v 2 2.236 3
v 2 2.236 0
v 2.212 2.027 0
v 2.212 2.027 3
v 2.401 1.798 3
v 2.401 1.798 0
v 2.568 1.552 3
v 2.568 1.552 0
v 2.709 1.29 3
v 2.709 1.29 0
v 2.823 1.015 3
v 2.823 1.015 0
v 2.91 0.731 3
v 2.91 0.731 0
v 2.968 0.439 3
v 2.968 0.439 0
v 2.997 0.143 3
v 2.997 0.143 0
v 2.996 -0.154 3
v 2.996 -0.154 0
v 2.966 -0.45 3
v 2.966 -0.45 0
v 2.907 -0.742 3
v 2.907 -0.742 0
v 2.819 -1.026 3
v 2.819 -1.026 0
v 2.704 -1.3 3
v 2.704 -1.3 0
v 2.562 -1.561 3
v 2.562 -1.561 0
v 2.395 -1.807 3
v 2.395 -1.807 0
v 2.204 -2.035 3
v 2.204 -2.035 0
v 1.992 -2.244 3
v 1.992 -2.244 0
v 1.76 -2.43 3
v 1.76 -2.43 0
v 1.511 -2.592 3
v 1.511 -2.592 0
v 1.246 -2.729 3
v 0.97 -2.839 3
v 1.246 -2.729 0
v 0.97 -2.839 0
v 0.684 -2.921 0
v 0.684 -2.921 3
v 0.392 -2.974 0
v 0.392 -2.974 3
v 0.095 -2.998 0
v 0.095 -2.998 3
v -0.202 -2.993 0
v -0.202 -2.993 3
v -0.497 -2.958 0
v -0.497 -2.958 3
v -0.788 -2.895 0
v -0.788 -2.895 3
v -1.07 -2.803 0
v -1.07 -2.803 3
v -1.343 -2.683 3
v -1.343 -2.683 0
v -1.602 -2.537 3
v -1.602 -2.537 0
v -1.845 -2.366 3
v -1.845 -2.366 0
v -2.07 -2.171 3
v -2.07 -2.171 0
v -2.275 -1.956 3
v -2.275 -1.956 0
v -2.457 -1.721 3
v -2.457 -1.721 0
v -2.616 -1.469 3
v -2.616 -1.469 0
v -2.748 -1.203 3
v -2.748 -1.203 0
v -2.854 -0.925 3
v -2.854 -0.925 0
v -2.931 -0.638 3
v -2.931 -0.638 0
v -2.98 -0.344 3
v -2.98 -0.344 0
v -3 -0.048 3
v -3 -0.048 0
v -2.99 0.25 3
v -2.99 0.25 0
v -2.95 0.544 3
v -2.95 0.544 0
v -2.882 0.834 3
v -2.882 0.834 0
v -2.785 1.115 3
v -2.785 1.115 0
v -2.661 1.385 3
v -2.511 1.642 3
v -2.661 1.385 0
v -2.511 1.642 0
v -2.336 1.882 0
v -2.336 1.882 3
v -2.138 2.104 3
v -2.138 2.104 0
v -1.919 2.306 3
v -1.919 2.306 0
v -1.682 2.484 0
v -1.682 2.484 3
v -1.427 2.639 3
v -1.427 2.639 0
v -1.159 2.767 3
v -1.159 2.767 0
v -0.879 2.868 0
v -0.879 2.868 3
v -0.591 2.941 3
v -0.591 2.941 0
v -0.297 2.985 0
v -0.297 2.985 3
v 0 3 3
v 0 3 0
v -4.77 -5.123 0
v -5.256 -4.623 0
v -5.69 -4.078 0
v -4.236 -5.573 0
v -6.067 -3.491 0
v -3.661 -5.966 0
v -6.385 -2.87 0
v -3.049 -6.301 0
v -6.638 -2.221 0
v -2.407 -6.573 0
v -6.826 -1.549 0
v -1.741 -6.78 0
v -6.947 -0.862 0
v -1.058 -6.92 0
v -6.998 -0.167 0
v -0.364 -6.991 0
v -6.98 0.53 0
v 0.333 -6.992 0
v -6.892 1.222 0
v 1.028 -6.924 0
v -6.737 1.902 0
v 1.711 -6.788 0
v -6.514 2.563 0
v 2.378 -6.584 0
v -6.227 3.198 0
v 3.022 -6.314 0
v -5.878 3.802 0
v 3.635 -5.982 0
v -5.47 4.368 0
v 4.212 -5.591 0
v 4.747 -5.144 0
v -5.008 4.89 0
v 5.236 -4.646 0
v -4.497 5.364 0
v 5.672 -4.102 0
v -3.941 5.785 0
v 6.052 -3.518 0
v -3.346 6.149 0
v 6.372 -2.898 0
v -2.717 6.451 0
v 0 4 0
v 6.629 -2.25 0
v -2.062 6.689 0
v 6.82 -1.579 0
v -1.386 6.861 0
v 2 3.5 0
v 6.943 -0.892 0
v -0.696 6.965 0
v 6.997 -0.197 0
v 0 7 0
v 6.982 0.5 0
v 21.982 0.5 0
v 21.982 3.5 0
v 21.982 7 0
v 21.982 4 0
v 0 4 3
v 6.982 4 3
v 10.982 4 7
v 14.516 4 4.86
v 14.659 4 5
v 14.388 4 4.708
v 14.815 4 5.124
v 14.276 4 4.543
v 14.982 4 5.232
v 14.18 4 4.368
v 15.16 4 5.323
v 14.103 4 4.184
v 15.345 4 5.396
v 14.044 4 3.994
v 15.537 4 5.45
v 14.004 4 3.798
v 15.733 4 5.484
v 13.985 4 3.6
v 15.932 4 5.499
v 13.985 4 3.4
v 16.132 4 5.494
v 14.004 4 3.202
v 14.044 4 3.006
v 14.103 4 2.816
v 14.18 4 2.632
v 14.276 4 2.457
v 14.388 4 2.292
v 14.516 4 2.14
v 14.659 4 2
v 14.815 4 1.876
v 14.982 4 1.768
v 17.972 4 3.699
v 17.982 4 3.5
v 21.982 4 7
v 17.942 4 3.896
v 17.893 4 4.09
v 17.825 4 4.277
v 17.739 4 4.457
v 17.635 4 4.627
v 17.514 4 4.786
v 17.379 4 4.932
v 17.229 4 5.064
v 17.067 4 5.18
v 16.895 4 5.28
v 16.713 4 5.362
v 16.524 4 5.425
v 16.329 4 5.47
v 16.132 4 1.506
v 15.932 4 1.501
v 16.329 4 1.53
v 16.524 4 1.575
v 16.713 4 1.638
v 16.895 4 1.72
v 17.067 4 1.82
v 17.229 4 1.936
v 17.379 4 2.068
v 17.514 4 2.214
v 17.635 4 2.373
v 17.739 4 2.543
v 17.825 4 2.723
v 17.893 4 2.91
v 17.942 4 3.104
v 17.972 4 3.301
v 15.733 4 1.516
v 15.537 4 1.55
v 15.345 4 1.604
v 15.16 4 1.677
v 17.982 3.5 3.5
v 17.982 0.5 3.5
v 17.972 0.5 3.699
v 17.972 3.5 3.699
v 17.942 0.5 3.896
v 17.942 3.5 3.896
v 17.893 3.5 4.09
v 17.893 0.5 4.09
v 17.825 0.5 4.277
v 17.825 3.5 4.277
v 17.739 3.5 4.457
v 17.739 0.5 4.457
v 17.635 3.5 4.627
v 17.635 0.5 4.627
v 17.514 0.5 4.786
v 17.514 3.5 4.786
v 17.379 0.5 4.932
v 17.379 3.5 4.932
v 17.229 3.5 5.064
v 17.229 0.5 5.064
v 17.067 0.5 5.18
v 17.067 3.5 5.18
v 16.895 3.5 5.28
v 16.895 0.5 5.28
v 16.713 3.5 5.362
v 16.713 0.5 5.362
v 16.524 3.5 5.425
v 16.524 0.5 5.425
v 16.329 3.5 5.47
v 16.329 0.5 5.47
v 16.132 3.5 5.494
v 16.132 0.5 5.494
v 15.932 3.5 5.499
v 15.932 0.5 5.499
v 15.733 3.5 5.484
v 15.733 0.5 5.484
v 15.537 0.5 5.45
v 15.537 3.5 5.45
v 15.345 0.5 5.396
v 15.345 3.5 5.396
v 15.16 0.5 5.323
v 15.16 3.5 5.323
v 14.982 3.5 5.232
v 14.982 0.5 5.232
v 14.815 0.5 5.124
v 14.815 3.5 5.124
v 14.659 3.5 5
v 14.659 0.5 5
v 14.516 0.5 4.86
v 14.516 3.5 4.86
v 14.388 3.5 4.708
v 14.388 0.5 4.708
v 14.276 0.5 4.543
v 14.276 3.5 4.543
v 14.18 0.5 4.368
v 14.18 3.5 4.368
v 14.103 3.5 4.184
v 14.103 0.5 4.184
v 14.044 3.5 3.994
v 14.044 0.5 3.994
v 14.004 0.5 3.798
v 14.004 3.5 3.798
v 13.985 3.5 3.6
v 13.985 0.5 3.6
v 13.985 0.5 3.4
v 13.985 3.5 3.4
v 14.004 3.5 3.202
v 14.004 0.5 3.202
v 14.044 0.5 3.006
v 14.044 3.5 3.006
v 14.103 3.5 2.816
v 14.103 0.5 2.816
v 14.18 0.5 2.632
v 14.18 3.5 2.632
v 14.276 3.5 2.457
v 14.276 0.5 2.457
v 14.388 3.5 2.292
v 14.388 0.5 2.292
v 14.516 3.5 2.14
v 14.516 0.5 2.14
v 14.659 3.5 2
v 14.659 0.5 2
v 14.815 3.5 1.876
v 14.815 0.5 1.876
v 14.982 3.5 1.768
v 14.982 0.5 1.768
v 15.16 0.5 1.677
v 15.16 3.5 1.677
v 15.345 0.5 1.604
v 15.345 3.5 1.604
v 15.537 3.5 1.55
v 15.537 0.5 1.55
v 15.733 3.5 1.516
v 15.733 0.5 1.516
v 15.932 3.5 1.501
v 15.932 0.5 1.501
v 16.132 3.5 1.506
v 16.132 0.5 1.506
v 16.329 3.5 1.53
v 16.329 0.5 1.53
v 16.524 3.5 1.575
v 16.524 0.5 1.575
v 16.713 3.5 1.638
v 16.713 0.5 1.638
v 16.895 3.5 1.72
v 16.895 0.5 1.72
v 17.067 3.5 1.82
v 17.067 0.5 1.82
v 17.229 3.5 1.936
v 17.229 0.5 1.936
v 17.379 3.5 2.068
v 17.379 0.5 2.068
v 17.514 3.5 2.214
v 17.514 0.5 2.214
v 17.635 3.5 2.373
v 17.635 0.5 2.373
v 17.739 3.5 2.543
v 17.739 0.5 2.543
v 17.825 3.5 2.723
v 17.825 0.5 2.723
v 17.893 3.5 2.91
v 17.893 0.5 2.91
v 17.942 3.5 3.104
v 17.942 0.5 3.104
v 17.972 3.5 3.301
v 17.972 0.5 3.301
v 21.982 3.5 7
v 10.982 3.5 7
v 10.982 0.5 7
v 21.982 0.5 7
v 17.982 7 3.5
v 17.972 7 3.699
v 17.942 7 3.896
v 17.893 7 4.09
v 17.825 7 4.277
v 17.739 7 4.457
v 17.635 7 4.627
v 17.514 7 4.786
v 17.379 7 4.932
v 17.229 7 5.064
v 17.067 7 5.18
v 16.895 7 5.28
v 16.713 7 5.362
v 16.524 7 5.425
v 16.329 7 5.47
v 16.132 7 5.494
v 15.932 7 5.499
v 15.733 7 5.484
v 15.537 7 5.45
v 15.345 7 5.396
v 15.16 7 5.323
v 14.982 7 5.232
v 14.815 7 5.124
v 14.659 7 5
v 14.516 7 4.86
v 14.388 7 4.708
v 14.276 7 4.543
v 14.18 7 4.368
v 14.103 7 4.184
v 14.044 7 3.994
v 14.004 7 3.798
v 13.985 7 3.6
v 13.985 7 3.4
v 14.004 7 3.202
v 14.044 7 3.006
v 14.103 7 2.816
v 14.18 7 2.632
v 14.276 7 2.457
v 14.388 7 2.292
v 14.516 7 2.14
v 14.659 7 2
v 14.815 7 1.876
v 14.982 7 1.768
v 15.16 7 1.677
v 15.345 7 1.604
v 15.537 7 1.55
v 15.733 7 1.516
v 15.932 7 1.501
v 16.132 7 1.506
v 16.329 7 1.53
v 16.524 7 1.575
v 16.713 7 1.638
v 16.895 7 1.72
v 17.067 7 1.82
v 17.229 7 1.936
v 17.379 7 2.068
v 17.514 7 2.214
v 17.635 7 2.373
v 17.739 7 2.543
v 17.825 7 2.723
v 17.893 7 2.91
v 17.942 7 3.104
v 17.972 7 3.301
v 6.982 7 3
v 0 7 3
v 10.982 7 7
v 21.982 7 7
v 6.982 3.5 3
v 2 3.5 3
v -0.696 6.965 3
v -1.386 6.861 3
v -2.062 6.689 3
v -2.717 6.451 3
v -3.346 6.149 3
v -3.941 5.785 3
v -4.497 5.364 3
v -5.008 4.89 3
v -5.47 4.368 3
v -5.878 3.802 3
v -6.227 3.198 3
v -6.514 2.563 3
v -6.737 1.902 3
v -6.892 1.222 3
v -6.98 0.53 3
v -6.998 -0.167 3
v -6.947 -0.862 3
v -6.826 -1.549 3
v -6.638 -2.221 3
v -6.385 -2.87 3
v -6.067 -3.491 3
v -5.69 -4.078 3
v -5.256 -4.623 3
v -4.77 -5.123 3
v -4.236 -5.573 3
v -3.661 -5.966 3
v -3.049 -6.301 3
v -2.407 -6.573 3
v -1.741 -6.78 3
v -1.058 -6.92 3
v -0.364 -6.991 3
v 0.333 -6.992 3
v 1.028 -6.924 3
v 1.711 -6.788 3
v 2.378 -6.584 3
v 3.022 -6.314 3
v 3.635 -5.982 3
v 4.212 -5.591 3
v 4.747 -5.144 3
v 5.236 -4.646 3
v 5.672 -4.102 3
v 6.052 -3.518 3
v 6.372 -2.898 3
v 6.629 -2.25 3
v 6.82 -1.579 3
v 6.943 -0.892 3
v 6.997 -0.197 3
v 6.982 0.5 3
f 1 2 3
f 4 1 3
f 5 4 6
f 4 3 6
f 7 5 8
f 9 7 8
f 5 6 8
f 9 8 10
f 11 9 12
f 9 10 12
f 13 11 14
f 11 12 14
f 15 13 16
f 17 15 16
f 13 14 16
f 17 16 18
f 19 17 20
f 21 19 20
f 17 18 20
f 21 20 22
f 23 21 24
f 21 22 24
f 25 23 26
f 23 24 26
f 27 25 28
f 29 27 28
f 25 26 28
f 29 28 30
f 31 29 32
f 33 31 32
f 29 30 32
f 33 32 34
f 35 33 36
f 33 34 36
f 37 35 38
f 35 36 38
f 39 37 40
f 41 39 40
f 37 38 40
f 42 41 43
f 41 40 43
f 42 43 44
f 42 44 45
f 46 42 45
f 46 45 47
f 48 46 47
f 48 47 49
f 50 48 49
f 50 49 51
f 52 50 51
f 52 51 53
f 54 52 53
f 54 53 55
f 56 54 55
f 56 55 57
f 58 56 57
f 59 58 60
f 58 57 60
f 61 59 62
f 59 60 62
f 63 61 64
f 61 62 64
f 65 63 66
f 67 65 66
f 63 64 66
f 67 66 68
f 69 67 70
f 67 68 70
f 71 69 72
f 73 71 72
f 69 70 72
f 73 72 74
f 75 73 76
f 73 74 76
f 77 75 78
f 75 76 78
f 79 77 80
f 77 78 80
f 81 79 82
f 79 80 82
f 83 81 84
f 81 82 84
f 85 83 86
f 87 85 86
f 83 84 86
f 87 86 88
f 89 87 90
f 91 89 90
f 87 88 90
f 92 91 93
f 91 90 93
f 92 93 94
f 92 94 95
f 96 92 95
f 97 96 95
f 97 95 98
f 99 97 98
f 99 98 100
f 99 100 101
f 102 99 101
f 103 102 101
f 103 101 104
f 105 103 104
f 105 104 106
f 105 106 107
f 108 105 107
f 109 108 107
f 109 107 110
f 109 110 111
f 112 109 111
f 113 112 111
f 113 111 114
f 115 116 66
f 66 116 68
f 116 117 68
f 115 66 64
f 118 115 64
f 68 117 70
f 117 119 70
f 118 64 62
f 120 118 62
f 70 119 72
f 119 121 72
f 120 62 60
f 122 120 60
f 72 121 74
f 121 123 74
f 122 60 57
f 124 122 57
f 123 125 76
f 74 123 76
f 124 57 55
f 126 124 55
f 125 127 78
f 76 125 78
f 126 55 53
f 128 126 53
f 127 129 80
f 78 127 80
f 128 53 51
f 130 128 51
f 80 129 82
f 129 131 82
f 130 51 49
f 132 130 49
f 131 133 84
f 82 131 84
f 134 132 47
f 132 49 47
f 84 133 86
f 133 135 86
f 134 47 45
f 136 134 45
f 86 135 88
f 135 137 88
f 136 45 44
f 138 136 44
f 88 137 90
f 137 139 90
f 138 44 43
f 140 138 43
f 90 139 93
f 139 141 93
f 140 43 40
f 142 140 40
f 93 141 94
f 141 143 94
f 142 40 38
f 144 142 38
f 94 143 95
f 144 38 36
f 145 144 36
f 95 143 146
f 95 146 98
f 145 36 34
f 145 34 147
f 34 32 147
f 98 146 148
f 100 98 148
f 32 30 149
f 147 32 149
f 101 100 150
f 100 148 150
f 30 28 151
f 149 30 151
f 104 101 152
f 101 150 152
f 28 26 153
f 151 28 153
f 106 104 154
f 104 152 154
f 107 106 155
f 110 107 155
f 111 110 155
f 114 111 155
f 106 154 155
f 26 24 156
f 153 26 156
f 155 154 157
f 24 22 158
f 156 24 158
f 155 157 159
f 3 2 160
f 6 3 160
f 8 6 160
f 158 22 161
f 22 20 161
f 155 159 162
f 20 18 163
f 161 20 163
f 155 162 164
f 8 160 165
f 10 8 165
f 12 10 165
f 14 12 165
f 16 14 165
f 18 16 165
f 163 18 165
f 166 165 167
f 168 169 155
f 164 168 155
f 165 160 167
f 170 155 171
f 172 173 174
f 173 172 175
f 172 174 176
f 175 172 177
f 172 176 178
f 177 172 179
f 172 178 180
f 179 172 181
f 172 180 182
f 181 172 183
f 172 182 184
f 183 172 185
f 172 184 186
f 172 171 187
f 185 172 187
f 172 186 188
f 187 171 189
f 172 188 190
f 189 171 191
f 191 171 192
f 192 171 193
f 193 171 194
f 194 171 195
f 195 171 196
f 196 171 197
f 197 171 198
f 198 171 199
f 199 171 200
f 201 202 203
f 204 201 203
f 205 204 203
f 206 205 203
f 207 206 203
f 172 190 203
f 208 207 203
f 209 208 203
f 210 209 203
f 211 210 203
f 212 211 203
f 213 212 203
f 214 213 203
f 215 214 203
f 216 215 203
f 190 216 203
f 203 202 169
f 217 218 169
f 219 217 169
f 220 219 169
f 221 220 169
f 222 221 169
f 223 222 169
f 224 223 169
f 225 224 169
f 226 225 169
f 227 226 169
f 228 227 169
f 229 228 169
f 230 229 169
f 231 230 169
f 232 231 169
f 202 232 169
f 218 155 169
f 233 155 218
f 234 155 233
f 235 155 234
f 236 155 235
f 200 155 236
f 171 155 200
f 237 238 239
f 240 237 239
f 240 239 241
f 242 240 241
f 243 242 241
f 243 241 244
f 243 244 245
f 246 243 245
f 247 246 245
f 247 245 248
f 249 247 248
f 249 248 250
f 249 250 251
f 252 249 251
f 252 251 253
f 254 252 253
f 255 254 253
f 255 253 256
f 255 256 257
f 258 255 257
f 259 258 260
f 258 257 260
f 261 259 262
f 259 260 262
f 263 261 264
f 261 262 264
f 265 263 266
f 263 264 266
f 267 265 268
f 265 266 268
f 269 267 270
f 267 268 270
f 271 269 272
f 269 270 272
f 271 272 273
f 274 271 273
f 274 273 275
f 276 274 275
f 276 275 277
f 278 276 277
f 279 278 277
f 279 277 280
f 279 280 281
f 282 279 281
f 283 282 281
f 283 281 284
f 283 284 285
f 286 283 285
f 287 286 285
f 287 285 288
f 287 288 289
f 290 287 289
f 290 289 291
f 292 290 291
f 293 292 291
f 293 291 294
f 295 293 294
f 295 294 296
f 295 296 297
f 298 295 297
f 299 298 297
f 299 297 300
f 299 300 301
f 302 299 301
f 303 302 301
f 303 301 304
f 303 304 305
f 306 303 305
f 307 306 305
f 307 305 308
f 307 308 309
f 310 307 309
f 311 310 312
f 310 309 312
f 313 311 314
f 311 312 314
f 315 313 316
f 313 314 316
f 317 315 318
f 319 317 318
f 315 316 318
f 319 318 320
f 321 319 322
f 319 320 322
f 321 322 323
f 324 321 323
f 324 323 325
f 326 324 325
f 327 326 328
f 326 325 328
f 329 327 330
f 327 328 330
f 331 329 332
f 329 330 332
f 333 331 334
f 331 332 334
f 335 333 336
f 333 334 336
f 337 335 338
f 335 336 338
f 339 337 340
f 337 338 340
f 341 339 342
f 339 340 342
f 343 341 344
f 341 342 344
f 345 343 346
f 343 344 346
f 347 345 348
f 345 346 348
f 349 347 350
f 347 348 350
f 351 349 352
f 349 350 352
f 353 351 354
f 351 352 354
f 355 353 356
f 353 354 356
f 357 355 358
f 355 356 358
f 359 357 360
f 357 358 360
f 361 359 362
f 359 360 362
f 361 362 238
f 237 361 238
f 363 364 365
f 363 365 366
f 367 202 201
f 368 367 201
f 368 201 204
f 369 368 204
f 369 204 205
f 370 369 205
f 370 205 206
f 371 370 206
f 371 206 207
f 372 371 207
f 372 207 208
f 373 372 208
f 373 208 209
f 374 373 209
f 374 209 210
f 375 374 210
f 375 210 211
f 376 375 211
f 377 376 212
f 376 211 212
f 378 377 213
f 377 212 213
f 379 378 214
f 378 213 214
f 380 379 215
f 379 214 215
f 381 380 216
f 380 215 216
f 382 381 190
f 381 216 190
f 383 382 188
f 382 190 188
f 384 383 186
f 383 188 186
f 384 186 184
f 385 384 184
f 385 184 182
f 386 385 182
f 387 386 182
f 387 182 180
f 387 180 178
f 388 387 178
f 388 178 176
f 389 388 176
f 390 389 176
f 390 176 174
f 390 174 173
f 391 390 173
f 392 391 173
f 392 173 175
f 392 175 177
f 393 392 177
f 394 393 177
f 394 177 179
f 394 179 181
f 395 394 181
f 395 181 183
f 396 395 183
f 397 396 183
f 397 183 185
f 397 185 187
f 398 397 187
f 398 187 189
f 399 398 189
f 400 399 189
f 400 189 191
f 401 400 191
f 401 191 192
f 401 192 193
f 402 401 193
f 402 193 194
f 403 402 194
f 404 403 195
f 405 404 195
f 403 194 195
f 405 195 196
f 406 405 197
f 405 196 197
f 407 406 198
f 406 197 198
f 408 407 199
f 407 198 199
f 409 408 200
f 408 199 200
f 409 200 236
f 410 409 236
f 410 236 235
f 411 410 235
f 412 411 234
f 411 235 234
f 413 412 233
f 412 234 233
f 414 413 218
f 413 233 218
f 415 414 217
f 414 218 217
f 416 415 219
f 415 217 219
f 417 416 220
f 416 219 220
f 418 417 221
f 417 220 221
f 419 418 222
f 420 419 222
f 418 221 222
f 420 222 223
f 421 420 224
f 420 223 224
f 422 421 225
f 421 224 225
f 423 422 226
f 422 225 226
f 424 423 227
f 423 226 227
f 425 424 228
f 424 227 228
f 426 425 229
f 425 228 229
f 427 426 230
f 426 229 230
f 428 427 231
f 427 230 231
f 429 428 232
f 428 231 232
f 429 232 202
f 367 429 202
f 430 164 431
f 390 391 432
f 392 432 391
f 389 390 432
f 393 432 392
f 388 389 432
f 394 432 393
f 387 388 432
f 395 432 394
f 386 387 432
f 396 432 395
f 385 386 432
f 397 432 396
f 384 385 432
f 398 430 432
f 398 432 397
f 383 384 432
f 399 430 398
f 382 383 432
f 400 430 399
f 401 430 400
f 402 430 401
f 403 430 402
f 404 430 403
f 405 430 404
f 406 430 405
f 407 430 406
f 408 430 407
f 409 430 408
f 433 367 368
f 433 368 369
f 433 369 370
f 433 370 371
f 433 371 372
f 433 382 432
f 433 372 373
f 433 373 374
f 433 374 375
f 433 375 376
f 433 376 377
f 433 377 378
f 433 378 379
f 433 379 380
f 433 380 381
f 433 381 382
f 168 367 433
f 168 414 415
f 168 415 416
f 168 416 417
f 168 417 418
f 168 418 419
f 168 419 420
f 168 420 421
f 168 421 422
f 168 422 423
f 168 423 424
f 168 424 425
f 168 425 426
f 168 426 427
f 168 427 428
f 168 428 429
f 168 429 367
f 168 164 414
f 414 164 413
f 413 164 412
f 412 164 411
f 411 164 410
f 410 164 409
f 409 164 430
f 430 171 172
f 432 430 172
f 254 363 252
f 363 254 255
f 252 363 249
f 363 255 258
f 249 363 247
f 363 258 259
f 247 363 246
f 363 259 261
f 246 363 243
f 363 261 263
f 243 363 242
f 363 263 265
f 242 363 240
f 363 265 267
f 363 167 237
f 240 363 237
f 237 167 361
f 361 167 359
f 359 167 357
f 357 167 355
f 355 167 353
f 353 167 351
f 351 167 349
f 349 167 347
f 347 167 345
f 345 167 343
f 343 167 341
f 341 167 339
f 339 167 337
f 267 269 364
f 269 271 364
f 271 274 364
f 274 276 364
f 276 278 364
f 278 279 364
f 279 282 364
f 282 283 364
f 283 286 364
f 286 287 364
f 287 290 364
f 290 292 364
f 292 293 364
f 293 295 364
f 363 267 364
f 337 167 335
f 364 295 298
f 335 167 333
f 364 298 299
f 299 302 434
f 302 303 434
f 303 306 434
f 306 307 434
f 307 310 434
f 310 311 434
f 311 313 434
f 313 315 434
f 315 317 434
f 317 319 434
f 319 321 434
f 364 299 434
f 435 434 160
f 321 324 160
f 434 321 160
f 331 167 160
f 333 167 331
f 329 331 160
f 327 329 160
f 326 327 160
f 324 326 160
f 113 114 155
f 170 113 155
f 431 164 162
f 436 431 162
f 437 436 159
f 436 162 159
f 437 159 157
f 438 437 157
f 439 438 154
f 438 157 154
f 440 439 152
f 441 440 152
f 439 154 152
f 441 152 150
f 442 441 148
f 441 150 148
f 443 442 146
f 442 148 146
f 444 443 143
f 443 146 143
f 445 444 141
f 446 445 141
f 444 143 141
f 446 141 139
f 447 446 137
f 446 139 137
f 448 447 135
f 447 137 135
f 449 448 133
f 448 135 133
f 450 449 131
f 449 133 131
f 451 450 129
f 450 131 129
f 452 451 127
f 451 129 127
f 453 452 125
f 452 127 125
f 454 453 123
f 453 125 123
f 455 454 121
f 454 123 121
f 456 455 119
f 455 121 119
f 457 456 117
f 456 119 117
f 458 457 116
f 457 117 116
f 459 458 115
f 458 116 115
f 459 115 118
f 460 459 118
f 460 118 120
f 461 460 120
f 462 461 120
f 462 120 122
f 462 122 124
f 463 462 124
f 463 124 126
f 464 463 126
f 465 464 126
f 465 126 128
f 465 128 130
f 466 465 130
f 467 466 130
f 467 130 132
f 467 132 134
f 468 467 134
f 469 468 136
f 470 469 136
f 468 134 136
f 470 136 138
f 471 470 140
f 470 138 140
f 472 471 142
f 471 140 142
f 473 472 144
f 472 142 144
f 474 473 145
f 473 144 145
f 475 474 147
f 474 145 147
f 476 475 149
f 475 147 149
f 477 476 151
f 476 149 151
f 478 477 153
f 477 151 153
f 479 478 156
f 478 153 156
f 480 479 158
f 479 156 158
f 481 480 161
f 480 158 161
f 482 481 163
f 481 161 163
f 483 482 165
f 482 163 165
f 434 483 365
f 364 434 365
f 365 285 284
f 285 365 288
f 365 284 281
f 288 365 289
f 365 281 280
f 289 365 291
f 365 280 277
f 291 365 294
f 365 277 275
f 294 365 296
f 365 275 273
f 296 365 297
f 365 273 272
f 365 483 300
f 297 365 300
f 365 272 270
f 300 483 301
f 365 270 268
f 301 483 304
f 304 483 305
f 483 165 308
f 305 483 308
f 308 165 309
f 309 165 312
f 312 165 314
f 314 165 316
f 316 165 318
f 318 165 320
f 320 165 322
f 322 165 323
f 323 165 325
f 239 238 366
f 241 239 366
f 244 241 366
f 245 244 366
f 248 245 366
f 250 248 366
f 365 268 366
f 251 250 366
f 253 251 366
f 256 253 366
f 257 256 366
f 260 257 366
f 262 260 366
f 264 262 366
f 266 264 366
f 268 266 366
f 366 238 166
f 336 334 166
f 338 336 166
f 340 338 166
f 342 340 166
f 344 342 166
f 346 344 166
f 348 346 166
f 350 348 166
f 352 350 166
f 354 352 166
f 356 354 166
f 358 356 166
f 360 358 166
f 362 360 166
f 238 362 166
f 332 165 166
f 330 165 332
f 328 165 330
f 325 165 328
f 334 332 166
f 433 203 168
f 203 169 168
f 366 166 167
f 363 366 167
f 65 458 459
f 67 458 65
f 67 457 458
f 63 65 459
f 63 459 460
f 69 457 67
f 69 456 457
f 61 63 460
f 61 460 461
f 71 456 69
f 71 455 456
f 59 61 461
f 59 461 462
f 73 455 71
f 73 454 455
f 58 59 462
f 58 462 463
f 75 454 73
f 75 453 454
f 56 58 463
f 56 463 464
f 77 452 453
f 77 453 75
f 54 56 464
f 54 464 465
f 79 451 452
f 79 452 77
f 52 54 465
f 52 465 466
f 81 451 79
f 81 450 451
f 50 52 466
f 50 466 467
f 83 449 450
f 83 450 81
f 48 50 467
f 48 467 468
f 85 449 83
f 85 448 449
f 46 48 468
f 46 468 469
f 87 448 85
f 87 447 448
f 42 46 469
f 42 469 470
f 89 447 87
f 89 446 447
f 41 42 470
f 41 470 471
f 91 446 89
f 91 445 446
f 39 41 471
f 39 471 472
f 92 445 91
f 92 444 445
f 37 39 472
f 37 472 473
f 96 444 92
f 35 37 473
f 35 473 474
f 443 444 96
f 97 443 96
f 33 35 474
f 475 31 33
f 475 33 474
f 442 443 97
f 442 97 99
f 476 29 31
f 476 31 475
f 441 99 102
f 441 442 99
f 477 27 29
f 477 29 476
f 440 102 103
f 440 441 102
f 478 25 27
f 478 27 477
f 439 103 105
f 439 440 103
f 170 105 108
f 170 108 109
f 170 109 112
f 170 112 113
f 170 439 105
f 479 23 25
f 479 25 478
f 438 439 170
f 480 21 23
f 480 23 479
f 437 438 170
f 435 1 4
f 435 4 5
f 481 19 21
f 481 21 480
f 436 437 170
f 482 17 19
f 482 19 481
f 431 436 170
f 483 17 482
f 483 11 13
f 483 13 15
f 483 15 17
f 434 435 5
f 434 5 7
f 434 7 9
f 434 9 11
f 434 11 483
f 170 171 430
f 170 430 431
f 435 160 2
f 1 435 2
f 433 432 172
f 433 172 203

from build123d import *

# Parameters (mm, degrees)
F1_DEPTH = 3
F2_W     = 15
F2_H     = 3
F3_DEPTH = 4
F5_DEPTH = 6.501
F6_R     = 2
F7_DEPTH = 6.501


with BuildPart() as f1:
    # F0 (on Top) → F1 (new body)
    with BuildSketch(Plane.XY):
        with BuildLine():
            ThreePointArc((2, 2.236068), (-1.070466, -2.802517), (0, 3))
            Line((0, 3), (0, 4))
            Line((0, 4), (21.98212, 4))
            Line((21.98212, 4), (21.98212, 7))
            Line((21.98212, 7), (0, 7))
            ThreePointArc((0, 7), (-4.769696, -5.123475), (6.98212, 0.5))
            Line((6.98212, 0.5), (21.98212, 0.5))
            Line((21.98212, 0.5), (21.98212, 3.5))
            Line((21.98212, 3.5), (2, 3.5))
            Line((2, 3.5), (2, 2.236068))
        make_face()
    extrude(amount=F1_DEPTH)

    # F2 (on face) → F3 (join)
    with BuildSketch(Plane.XY.offset(3)):
        with Locations((14.48212, 5.5)):
            Rectangle(F2_W, F2_H)
        with Locations((14.48212, 2)):
            Rectangle(F2_W, F2_H)
    extrude(amount=F3_DEPTH)

    # F4 (on face) → F5 (cut, through all)
    with BuildSketch(Plane.XZ.offset(-0.5)):
        Polygon((6.98212, 7), (6.98212, 3), (10.98212, 7), align=None)
    extrude(amount=-F5_DEPTH, mode=Mode.SUBTRACT)

    # F6 (on face) → F7 (cut, through all)
    with BuildSketch(Plane.XZ.offset(-0.5)):
        with Locations((15.98212, 3.5)):
            Circle(F6_R)
    extrude(amount=-F7_DEPTH, mode=Mode.SUBTRACT)


solid = f1.part
